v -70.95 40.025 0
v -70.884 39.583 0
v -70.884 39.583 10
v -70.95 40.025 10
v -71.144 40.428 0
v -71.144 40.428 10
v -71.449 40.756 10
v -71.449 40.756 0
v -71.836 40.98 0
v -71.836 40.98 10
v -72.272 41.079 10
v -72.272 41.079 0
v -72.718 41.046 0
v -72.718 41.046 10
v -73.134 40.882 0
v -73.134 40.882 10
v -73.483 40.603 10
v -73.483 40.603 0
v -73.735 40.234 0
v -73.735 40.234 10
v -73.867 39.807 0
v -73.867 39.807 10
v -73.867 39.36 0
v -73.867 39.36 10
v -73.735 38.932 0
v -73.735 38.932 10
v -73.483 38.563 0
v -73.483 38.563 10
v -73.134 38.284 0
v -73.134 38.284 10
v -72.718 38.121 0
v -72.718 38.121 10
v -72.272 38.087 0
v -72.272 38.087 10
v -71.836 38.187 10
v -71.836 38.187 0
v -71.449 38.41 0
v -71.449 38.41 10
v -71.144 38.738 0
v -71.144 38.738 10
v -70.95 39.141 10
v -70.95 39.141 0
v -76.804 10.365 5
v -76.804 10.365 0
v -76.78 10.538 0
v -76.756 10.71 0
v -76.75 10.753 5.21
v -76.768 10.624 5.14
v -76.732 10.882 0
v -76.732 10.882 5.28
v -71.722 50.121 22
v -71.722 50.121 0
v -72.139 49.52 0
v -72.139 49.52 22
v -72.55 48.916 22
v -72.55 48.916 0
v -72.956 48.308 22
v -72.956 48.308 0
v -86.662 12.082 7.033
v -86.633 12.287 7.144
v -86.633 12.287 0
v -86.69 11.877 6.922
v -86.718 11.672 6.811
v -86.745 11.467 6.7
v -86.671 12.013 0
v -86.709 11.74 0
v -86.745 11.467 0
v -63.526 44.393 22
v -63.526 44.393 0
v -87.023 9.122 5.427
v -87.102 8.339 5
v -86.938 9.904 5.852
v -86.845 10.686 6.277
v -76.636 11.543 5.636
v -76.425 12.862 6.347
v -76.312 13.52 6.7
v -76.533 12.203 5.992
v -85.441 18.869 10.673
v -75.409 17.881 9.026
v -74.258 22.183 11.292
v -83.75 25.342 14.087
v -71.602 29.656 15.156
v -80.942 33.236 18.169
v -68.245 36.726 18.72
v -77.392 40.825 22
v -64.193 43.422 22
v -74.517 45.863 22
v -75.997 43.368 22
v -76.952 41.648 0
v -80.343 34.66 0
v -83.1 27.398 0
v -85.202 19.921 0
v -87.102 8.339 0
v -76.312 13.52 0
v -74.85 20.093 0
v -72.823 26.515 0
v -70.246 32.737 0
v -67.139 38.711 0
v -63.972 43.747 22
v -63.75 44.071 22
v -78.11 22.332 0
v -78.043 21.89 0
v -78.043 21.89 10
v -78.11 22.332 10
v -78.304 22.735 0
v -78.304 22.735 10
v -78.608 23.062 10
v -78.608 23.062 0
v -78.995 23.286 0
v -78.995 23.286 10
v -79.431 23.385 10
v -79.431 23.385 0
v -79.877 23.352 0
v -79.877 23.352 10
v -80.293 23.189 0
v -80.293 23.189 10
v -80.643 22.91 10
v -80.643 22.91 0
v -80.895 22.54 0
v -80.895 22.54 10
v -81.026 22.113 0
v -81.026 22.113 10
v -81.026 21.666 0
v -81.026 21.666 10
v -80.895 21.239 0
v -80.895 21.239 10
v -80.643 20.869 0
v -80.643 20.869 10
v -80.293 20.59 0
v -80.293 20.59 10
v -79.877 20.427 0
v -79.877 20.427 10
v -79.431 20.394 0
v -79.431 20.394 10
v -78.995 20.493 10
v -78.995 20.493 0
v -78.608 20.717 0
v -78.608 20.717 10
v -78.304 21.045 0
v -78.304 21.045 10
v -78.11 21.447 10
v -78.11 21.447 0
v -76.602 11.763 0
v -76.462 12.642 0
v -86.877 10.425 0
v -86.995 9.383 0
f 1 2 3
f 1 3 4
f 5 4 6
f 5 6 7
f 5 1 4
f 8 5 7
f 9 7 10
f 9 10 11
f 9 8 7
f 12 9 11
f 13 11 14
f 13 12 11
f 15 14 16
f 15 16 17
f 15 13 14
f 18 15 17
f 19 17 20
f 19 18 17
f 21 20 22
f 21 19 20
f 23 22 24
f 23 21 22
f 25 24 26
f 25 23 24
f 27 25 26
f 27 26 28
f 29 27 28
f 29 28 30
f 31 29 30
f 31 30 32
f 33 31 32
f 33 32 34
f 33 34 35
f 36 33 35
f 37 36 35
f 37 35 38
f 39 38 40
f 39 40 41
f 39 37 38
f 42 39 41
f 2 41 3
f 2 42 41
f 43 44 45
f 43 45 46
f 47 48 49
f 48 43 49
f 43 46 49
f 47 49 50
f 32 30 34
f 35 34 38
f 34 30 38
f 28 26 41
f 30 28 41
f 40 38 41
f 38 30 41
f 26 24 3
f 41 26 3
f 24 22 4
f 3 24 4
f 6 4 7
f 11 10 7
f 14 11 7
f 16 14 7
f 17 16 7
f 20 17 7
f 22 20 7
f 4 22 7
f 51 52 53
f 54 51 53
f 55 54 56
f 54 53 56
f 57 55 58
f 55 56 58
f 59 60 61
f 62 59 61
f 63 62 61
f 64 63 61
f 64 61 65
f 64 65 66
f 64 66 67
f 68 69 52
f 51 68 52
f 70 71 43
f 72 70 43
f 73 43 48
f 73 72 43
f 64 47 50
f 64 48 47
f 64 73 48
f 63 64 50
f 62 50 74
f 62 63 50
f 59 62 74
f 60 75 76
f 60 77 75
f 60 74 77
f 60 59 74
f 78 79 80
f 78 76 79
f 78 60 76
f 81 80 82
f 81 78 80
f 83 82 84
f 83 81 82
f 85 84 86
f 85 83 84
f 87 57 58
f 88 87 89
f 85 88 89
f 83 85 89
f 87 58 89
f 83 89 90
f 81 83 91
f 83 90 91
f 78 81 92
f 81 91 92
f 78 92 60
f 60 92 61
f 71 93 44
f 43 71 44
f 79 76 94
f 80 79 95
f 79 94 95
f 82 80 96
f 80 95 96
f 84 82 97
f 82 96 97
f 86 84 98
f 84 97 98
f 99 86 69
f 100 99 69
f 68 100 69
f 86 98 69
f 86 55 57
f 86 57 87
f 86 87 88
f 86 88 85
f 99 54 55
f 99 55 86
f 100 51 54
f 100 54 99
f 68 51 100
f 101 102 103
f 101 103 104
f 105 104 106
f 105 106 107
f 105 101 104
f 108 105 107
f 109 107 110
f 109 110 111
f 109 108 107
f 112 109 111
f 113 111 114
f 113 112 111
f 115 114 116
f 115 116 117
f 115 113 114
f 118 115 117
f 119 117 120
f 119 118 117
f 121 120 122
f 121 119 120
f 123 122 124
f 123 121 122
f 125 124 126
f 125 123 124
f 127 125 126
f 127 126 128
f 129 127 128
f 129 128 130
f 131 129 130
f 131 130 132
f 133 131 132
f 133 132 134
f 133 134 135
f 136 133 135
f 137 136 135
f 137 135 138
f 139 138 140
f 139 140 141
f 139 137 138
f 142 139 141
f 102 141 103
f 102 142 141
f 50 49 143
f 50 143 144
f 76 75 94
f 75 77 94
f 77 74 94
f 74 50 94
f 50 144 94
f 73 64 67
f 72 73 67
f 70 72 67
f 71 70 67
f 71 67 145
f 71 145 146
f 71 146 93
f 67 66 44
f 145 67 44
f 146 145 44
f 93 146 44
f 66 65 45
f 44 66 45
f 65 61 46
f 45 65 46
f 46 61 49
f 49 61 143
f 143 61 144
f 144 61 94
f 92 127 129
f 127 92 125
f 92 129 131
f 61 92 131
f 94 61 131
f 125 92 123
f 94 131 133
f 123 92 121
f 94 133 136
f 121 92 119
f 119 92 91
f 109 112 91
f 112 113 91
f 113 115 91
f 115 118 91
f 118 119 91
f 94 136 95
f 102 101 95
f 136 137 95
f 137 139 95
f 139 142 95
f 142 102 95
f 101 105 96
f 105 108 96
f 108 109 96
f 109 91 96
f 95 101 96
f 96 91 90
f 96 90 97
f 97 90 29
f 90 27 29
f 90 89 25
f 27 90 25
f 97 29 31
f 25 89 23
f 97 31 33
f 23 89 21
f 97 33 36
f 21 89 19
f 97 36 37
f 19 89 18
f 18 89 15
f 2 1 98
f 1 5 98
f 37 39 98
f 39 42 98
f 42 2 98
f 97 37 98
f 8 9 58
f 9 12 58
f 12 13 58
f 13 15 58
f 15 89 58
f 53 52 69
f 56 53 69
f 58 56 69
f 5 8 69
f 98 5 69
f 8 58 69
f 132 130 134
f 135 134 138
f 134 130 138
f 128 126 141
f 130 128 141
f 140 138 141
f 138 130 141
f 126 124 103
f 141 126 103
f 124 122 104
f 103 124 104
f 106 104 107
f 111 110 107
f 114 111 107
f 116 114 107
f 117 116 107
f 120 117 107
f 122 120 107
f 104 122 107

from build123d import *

# Parameters (mm, degrees)
F0_R        = 1.5
F1_DEPTH    = 22
F2_T1_DEPTH = 165.7438624109
F3_DEPTH    = 10


# Not quite as in the source:
# - a fillet or chamfer that OpenCascade refuses, or shapes differently, is made with other operations: its cross-section is extruded or revolved along the edge and cut away or added


with BuildPart() as f1:
    # F0 (on Top) → F1 (new body)
    with BuildSketch(Plane.XY):
        with BuildLine():
            ThreePointArc((-76.7321565298, 10.8823781538), (-76.533256864, 12.202892845), (-76.3116336523, 13.5197843663))
            Line((-76.3116336523, 13.5197843663), (-84.2766601783, 11.9523616575))
            Line((-84.2766601783, 11.9523616575), (-76.7321565298, 10.8823781538))
        make_face()
        with BuildLine():
            ThreePointArc((-76.3116336523, 13.5197843663), (-71.9683443093, 28.7542591172), (-64.6180706596, 42.7873222372))
            Line((-64.6180706596, 42.7873222372), (-72.9558862286, 48.3082670421))
            ThreePointArc((-72.9558862286, 48.3082670421), (-81.8018975861, 31.0596128649), (-86.633079953, 12.2865559801))
            Line((-86.633079953, 12.2865559801), (-84.2766601783, 11.9523616575))
            Line((-84.2766601783, 11.9523616575), (-76.3116336523, 13.5197843663))
        make_face()
        with Locations((-79.5430595227, 21.8895336125)):
            Circle(F0_R, mode=Mode.SUBTRACT)
        with Locations((-72.3838330612, 39.5832124944)):
            Circle(F0_R, mode=Mode.SUBTRACT)
        with BuildLine():
            ThreePointArc((-64.6180706596, 42.7873222372), (-64.076826103, 43.5936962939), (-63.5255193134, 44.3932246628))
            Line((-63.5255193134, 44.3932246628), (-71.7223605151, 50.1213826839))
            ThreePointArc((-71.7223605151, 50.1213826839), (-72.3448036647, 49.218689364), (-72.9558862286, 48.3082670421))
            Line((-72.9558862286, 48.3082670421), (-64.6180706596, 42.7873222372))
        make_face()
        with BuildLine():
            ThreePointArc((-76.8036989266, 10.365415148), (-76.7683628871, 10.6239568725), (-76.7321565298, 10.8823781538))
            Line((-76.7321565298, 10.8823781538), (-84.2766601783, 11.9523616575))
            Line((-84.2766601783, 11.9523616575), (-86.7454235032, 11.466538329))
            ThreePointArc((-86.7454235032, 11.466538329), (-86.9376476661, 9.9043131153), (-87.1017395415, 8.3388829496))
            Line((-87.1017395415, 8.3388829496), (-76.8036989266, 10.365415148))
        make_face()
        with BuildLine():
            Line((-86.7454235032, 11.466538329), (-84.2766601783, 11.9523616575))
            Line((-84.2766601783, 11.9523616575), (-86.633079953, 12.2865559801))
            ThreePointArc((-86.633079953, 12.2865559801), (-86.6902213195, 11.8766799899), (-86.7454235032, 11.466538329))
        make_face()
        with Locations((-72.3838330612, 39.5832124944)):
            Circle(F0_R)
        with Locations((-79.5430595227, 21.8895336125)):
            Circle(F0_R)
    extrude(amount=F1_DEPTH)

    # F2: chamfer of 17 x 30 on 1 edges, made by hand

    # F2_s2 → F2_t1 (cut)
    with BuildSketch(Plane(origin=(-158.4380449398, -31.1787272483, 0), x_dir=(0, 0, 1), z_dir=(0.9811820369, 0.1930849823, 0))):
        Polygon((5, -25), (22, -55), (22, -25), align=None)
    extrude(amount=F2_T1_DEPTH, mode=Mode.SUBTRACT)

    # F0 (on Top) → F3 (cut)
    with BuildSketch(Plane.XY):
        with Locations((-72.3838330612, 39.5832124944)):
            Circle(F0_R)
        with Locations((-79.5430595227, 21.8895336125)):
            Circle(F0_R)
    extrude(amount=F3_DEPTH, mode=Mode.SUBTRACT)


solid = f1.part
